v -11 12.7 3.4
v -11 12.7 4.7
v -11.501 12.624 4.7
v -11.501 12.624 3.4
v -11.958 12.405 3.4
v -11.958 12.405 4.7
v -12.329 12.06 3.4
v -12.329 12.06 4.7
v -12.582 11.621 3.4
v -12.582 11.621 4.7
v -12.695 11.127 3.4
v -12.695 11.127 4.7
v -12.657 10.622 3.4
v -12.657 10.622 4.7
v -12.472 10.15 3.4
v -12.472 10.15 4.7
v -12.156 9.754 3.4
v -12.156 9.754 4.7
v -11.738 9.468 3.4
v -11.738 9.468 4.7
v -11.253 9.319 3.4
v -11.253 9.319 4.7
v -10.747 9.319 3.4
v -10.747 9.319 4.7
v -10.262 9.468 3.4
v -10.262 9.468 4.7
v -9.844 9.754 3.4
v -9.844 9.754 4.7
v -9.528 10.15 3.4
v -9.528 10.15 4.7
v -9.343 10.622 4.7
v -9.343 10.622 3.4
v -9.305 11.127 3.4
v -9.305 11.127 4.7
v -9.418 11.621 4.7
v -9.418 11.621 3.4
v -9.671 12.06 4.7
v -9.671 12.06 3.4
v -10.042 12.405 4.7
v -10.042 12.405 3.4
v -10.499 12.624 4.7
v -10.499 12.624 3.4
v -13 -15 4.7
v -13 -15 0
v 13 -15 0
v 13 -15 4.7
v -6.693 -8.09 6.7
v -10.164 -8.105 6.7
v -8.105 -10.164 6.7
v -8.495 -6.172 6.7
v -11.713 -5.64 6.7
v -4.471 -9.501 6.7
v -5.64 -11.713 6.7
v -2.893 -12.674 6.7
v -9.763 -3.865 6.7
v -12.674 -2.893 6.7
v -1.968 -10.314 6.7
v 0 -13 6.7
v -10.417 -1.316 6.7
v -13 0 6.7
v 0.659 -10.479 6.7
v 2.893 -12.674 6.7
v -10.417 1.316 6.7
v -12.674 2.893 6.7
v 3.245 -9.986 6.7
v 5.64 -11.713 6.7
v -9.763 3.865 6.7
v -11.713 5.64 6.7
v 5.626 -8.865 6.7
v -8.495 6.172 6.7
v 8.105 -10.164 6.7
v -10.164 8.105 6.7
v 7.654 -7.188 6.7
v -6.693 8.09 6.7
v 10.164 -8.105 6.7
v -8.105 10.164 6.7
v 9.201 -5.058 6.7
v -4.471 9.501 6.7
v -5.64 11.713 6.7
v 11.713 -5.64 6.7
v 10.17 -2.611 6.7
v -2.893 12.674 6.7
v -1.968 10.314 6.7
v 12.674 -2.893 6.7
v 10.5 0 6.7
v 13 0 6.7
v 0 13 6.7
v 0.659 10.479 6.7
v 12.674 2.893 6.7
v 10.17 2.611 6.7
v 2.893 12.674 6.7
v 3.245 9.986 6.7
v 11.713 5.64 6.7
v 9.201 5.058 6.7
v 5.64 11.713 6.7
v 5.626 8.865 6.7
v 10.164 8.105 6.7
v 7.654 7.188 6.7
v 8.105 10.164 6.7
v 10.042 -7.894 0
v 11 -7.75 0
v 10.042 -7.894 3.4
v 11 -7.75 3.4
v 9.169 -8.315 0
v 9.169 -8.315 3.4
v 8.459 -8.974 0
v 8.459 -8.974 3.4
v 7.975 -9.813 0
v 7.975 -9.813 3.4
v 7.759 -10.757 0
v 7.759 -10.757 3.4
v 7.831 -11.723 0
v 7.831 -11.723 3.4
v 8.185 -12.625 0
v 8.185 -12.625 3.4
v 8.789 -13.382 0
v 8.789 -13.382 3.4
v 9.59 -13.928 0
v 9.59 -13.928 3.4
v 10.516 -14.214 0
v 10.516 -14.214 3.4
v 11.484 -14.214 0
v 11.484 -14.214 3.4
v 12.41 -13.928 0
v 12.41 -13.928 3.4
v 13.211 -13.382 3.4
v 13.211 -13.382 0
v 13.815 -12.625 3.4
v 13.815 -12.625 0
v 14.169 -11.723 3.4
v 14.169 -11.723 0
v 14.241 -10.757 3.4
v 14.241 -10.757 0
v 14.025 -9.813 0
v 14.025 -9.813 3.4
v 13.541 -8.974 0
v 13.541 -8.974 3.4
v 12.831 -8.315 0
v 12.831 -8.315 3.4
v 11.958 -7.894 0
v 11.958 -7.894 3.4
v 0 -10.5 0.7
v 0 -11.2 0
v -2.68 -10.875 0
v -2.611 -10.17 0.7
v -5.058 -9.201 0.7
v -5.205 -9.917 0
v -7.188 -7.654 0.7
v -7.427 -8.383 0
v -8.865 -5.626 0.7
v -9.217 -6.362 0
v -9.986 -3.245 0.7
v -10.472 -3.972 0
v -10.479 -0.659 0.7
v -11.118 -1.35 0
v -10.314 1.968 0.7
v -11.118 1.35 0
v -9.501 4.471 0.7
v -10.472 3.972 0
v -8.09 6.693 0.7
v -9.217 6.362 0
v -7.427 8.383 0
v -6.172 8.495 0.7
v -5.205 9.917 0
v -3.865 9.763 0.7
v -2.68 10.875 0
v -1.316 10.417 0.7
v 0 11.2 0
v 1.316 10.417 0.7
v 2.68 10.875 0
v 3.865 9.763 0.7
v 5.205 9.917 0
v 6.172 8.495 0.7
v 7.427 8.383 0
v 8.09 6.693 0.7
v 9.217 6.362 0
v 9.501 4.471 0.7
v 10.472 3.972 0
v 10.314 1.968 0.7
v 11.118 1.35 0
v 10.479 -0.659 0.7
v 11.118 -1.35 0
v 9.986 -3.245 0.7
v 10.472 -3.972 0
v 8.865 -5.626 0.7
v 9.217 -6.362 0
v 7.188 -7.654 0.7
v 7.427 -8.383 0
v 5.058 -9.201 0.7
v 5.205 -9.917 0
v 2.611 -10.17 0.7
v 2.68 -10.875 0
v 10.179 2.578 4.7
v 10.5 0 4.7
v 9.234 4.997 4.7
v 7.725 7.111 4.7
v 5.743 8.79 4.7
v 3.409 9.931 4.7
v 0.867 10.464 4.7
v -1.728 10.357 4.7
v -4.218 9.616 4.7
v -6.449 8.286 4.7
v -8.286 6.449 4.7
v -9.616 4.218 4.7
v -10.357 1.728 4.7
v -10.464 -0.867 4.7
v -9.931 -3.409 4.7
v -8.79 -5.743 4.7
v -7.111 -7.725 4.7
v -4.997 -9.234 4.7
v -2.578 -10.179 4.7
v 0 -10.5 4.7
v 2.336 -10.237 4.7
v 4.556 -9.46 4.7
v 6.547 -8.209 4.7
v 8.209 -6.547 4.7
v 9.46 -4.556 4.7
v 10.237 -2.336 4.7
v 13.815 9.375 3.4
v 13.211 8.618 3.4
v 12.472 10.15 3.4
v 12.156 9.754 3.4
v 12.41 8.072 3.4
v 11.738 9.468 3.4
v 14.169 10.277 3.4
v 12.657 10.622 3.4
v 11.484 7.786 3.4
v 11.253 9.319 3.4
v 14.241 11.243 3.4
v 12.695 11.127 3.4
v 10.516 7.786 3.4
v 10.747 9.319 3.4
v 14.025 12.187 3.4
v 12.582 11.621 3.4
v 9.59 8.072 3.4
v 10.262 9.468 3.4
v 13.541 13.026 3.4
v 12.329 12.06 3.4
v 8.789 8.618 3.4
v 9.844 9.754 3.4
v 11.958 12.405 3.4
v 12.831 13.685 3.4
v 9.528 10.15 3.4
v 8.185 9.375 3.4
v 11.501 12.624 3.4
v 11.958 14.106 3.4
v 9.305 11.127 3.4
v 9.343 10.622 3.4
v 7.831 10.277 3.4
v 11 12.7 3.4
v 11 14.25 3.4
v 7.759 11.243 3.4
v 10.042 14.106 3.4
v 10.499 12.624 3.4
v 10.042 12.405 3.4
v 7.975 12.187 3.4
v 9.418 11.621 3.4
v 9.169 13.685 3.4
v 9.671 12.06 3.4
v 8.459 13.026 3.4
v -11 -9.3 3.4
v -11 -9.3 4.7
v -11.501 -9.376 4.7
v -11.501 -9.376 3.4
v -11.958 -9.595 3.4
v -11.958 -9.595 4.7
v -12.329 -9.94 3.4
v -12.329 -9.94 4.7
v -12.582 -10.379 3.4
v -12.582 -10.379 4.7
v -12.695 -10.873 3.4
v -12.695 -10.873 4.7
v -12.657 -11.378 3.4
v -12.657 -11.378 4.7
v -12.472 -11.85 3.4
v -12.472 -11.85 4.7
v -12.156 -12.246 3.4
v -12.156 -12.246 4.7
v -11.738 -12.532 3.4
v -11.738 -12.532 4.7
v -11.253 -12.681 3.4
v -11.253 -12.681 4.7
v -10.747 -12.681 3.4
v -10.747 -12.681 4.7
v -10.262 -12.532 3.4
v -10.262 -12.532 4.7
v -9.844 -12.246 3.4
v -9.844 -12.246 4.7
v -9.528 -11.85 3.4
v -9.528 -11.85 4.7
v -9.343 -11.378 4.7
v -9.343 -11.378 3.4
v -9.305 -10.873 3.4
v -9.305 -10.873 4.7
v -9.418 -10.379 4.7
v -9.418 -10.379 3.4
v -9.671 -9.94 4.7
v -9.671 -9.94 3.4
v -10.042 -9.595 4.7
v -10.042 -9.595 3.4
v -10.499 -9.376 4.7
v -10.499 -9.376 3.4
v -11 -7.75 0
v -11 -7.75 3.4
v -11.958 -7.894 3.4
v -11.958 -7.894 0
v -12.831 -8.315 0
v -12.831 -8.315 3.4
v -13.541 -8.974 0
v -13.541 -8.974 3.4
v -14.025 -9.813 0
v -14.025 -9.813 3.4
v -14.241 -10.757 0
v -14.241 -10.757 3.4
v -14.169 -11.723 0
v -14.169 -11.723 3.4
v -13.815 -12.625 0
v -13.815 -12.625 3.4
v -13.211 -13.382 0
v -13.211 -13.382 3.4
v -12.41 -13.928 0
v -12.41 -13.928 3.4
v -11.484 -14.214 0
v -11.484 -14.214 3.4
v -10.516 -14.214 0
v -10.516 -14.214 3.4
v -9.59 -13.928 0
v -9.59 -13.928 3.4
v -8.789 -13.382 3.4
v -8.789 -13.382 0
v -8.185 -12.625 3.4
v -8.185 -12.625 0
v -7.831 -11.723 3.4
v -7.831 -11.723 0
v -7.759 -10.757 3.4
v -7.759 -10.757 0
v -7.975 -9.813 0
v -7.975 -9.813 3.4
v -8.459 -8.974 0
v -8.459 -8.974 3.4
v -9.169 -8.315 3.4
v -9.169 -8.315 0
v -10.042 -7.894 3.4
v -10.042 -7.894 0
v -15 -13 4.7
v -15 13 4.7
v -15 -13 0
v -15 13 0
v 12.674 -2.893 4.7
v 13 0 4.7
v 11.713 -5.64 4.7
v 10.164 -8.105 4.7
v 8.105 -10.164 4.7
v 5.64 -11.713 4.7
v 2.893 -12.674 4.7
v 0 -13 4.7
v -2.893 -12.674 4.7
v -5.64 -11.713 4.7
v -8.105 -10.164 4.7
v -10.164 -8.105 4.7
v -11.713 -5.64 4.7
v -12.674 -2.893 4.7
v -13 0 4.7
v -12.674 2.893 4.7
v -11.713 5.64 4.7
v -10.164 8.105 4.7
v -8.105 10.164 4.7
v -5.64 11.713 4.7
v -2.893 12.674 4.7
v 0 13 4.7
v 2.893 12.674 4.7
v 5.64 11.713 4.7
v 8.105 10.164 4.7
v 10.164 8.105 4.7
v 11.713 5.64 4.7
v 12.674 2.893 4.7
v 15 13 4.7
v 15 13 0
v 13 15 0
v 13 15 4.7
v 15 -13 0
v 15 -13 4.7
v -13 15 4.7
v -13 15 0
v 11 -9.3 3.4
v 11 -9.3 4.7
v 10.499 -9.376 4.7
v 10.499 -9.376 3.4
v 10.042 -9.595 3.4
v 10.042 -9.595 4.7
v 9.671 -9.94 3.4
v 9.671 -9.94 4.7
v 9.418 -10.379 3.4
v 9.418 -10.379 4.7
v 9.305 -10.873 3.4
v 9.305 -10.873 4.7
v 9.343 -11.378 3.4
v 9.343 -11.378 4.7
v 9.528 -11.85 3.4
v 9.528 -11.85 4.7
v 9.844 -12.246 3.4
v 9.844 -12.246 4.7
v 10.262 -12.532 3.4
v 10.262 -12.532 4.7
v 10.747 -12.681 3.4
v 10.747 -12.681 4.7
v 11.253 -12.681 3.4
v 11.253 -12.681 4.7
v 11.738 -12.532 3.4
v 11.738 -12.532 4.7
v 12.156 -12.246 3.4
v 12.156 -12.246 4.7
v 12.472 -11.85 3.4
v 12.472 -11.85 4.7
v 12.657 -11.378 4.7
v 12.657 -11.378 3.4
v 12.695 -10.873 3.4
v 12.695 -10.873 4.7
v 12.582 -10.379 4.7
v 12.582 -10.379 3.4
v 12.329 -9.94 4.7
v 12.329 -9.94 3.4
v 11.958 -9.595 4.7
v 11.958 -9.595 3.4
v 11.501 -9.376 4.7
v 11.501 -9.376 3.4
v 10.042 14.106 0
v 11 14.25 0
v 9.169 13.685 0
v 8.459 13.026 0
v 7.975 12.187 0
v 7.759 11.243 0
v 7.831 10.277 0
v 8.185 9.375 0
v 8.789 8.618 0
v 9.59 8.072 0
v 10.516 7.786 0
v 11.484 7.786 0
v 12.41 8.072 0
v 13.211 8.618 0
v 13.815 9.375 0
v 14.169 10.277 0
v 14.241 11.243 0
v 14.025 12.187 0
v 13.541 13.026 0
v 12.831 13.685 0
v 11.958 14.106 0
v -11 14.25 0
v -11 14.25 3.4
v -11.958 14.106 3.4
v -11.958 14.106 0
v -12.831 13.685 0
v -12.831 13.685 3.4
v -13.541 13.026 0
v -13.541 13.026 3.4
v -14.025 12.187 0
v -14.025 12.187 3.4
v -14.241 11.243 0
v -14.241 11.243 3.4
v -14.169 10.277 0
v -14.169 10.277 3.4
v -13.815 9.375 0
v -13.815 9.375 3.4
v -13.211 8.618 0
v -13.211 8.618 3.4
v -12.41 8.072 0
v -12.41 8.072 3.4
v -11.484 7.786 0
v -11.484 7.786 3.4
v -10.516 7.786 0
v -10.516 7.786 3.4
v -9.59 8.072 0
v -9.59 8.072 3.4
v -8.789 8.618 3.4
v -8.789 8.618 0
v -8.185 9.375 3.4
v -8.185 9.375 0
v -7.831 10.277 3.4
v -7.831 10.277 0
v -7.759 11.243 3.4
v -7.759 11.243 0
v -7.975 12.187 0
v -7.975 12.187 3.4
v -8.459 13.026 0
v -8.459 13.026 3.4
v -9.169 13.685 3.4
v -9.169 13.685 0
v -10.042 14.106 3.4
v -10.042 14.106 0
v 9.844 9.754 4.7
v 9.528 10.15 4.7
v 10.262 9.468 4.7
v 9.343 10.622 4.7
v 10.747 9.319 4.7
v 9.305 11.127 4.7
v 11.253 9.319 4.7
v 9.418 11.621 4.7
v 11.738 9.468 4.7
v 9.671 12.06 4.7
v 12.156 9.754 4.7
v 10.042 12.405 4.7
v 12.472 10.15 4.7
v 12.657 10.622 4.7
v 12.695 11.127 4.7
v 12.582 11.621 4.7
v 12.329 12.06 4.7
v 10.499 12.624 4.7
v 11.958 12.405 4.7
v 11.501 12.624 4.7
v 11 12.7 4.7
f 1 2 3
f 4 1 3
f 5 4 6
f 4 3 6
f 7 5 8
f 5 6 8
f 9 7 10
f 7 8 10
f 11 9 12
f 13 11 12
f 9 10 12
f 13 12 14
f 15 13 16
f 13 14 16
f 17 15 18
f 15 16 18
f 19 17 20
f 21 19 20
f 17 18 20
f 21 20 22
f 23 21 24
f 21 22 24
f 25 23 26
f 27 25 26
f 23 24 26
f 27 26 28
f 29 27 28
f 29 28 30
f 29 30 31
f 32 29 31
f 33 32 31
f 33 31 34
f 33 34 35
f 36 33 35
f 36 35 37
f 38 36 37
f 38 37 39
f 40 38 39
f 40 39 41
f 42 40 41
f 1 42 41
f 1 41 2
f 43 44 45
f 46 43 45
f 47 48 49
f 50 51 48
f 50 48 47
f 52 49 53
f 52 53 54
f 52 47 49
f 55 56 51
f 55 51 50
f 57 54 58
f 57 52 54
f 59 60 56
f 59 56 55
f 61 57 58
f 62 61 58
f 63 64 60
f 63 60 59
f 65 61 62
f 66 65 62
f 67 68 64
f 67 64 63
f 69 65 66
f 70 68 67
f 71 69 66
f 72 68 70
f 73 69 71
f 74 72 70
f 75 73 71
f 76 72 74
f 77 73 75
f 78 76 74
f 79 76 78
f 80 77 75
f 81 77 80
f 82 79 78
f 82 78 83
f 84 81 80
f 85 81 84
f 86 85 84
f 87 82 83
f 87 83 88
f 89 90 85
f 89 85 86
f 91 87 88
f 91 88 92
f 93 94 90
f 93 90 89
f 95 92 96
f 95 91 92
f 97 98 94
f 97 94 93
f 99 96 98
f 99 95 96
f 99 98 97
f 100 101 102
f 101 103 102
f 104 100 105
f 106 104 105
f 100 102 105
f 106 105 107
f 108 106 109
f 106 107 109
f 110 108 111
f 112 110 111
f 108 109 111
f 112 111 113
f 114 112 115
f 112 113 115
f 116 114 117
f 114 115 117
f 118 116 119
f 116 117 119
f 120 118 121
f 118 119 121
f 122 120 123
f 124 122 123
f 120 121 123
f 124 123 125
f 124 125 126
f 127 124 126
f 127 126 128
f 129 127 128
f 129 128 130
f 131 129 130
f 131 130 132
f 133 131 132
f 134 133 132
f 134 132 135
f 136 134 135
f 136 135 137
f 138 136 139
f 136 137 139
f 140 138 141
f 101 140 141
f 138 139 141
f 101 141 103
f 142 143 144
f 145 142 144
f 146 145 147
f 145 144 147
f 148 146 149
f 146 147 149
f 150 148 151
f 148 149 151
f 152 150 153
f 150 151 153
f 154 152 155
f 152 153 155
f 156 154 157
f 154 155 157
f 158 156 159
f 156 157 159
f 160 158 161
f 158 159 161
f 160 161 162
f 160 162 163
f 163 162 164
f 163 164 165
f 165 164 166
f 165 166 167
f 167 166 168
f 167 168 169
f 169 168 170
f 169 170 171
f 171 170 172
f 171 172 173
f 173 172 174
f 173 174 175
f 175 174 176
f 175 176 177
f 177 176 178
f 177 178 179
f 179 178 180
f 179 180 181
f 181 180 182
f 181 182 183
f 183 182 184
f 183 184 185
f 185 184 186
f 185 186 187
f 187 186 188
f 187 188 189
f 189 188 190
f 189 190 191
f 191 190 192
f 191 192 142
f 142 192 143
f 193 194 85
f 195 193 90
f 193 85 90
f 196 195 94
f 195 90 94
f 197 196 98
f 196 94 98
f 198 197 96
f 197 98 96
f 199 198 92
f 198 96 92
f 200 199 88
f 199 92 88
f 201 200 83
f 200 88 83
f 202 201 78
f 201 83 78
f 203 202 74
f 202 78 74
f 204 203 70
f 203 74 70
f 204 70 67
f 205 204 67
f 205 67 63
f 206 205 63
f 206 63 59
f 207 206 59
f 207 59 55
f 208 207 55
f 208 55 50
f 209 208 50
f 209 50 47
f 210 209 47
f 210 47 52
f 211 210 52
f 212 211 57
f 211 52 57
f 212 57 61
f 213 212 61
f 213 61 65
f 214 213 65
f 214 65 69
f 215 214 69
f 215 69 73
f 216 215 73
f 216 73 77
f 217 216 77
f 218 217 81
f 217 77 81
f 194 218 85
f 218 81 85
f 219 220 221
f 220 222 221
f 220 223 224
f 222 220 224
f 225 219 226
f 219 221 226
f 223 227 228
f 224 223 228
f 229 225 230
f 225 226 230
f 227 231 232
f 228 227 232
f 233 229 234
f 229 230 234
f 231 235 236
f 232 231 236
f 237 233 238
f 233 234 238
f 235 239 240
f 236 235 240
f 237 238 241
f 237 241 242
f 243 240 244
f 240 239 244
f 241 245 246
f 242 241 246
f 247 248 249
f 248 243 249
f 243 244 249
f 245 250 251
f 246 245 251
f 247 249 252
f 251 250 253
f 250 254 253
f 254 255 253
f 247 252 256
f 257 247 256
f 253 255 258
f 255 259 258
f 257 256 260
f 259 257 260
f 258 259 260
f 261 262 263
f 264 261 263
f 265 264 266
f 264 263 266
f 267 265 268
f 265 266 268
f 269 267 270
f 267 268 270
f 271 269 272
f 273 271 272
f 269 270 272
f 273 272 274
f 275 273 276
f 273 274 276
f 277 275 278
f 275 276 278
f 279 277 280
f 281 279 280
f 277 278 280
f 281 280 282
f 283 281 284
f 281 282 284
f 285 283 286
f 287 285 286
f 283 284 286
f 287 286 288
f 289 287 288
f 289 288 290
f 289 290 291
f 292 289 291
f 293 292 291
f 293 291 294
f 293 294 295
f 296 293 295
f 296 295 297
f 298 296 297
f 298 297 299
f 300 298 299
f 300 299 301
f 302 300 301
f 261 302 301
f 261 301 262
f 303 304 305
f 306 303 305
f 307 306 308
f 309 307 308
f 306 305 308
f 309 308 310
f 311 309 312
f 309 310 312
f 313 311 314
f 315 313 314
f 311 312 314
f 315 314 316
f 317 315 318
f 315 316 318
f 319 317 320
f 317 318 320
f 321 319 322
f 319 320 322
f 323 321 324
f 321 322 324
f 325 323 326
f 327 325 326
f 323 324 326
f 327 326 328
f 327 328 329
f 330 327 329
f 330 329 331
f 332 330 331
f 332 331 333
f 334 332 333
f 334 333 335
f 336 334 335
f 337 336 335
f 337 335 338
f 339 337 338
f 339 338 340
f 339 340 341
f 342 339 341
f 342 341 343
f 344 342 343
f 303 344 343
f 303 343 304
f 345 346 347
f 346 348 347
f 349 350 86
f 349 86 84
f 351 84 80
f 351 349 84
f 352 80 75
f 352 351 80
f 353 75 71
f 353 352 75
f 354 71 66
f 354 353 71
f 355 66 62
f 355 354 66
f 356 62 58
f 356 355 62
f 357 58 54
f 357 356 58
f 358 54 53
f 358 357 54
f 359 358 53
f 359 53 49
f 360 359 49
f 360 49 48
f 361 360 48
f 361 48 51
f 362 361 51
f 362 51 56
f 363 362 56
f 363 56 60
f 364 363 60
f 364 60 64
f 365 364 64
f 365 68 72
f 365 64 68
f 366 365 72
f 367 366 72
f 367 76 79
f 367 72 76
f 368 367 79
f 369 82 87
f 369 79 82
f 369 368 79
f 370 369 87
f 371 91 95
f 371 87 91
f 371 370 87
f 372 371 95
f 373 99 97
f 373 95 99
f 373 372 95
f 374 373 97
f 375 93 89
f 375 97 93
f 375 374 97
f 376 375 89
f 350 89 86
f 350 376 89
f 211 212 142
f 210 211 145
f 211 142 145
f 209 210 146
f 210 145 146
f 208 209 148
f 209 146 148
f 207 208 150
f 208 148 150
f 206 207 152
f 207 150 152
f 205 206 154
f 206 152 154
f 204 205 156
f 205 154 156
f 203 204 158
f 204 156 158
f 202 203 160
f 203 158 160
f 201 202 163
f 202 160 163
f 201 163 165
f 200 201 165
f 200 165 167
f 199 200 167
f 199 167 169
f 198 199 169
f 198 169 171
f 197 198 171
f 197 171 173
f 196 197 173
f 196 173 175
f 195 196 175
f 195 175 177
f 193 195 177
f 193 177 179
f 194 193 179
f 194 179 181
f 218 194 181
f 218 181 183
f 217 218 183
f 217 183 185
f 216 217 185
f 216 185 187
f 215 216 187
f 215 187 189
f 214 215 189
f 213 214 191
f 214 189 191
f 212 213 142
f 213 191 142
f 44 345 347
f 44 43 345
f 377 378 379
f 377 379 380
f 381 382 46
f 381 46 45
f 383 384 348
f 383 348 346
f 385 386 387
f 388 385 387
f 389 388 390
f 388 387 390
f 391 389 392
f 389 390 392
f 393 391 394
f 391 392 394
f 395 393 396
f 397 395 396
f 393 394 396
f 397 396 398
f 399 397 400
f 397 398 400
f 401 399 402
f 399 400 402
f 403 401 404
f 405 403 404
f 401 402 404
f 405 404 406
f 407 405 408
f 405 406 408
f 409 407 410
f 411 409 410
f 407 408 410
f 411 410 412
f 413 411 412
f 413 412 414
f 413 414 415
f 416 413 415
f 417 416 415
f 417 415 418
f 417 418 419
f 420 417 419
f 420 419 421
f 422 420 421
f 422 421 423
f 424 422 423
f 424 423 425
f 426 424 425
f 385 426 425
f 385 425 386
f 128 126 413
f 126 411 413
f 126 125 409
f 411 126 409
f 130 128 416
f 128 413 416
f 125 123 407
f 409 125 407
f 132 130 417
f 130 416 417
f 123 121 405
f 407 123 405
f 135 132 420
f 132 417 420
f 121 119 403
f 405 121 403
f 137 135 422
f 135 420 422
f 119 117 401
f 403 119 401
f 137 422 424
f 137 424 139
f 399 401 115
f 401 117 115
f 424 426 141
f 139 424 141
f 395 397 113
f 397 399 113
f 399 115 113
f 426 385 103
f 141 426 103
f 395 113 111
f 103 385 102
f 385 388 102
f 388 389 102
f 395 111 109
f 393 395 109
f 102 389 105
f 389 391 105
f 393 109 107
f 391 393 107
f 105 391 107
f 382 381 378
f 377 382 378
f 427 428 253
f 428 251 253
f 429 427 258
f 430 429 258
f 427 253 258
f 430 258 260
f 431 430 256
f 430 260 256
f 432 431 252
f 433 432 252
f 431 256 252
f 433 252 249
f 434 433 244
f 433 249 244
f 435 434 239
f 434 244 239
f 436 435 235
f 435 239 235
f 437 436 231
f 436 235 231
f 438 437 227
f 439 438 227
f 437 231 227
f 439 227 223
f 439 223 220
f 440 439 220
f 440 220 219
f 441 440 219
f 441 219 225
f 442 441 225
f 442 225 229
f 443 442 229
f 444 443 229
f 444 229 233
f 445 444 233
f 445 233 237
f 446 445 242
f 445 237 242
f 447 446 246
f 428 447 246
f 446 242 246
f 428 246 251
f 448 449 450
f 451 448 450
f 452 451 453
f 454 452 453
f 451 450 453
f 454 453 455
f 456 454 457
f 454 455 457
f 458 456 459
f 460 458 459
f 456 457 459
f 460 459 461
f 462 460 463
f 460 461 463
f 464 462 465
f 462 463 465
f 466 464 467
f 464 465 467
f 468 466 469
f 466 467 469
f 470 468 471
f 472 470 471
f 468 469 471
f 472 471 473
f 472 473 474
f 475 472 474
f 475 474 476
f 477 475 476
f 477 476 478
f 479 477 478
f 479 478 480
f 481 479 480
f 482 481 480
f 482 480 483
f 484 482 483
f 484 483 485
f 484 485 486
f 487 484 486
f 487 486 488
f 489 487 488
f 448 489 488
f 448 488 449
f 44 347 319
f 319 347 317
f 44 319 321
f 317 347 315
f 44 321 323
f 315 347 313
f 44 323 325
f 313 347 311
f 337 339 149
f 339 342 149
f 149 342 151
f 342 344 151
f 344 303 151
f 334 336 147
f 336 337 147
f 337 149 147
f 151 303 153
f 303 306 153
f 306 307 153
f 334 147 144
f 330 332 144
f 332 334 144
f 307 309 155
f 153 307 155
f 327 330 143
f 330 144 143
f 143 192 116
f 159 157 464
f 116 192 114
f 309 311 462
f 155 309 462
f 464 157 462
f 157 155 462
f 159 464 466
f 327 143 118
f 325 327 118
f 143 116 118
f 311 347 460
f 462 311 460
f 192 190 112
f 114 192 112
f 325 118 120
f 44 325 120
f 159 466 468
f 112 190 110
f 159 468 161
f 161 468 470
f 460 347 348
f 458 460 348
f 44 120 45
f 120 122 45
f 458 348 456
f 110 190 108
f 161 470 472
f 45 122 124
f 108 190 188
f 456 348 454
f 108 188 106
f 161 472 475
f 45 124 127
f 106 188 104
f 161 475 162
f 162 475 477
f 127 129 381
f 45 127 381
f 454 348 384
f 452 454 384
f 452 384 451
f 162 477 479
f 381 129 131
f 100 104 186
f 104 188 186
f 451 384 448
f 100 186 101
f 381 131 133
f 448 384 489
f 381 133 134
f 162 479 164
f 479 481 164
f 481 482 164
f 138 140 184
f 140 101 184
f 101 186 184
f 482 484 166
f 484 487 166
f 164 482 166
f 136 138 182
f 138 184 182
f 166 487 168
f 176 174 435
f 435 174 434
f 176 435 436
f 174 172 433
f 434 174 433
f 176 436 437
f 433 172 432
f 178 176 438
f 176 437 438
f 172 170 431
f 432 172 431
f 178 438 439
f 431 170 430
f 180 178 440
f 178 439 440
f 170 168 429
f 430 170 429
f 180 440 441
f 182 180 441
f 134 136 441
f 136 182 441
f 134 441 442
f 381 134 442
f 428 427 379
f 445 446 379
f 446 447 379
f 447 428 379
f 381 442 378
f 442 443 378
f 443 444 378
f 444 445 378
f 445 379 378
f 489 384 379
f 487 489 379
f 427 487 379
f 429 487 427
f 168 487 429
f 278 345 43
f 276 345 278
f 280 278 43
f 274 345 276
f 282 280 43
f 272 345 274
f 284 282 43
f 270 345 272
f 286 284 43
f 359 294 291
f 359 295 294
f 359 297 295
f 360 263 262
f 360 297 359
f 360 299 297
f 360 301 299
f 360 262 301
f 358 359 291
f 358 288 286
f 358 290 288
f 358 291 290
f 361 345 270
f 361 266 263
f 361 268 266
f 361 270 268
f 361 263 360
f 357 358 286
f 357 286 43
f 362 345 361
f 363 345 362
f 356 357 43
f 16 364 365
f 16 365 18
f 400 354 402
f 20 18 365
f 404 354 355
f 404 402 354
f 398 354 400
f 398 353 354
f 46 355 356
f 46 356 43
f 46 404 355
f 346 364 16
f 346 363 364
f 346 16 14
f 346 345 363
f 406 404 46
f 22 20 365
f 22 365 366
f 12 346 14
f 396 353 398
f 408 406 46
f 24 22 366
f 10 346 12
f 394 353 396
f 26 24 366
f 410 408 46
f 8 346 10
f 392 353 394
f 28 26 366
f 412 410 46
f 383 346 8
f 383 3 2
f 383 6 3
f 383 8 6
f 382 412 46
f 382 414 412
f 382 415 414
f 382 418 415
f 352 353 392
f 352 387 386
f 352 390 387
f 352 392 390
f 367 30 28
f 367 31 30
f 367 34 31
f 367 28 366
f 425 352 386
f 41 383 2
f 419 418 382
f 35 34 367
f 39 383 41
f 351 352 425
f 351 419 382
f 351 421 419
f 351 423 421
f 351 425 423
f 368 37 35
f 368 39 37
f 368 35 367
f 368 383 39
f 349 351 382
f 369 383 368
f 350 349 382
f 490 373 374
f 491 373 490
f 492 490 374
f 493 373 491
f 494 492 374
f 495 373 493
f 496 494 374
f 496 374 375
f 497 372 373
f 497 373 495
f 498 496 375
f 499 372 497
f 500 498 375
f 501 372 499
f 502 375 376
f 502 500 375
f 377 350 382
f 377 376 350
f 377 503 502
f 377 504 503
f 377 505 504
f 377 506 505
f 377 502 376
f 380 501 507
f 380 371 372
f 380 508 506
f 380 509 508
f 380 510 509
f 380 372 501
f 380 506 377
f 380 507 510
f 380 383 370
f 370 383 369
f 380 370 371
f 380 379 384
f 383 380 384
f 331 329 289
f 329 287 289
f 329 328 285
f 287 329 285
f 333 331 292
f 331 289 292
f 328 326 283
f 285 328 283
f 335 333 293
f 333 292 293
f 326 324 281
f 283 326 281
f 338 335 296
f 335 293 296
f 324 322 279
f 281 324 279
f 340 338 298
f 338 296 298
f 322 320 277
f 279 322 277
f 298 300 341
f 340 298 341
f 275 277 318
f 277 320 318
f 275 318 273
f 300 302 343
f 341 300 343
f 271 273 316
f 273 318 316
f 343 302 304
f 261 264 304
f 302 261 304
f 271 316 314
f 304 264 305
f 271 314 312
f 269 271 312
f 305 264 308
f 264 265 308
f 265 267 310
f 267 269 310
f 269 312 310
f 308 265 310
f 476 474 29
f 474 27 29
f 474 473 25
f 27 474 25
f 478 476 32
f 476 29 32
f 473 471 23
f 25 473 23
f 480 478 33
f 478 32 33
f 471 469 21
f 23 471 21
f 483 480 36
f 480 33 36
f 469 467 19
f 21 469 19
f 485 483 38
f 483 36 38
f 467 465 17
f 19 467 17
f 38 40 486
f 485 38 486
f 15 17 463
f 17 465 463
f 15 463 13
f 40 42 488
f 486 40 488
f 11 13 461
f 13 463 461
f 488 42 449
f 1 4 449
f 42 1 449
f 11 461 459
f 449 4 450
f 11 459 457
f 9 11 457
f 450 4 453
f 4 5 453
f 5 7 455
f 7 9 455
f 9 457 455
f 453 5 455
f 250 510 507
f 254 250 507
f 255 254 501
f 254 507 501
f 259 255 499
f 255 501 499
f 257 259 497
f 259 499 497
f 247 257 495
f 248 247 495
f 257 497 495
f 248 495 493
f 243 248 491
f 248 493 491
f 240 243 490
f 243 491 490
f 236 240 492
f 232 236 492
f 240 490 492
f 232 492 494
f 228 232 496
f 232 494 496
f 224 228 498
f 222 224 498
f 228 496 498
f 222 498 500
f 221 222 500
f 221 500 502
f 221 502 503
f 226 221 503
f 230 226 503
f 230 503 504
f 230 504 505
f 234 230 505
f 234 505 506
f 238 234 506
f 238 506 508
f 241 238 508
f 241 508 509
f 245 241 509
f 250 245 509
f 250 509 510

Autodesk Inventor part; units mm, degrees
ref_plane "YZ Plane" through (0, 0, 0) normal (1, 0, 0) x (0, 1, 0)
ref_plane "XZ Plane" through (0, 0, 0) normal (0, 1, 0) x (-1, 0, 0)
ref_plane "XY Plane" through (0, 0, 0) normal (0, 0, 1) x (1, 0, 0)
sketch "Sketch1" plane through (0, 0, 0) normal (0, 0, 1) x (1, 0, 0)
  line L0 (-15, -15) -> (15, -15)
  line L1 (15, -15) -> (15, 15)
  line L2 (15, 15) -> (-15, 15)
  line L3 (-15, 15) -> (-15, -15)
  line L4 (-15, -15) -> (15, 15) construction
  line L5 (15, -15) -> (-15, 15) construction
  point P0 (0, 0)
  dimension "d0" = 30
  dimension "d1" = 30
extrude "Extrusion1" add sketch "Sketch1" along normal blind 4.7
sketch "Sketch2" plane through (0, 0, 4.7) normal (0, 0, 1) x (1, 0, 0)
  point P0 (0, 0)
hole "Hole1" at (0, 0, 4.7) direction (0, 0, -1) diameter 21 end through all
sketch "Sketch3" plane through (0, 0, 0) normal (0, 1, 0) x (-1, 0, 0)
  line L0 (-10.5, 6.7) -> (-13, 6.7)
  line L1 (-13, 6.7) -> (-13, 4.7)
  line L2 (-13, 4.7) -> (-10.5, 4.7)
  line L3 (-10.5, 4.7) -> (-10.5, 6.7)
  line L4 (-15, 4.7) -> (15, 4.7) projected
  line L5 (-10.5, 0) -> (-10.5, 4.7) projected
  line L6 (0, 0) -> (0, 4.7)
  line L7 (10.5, 0) -> (-10.5, 0) projected
  dimension "d13" = 26
  dimension "d15" = 2
revolve "Revolution1" add sketch "Sketch3" angle 360 about axis through (0, 0, 0) along (0, 0, 1) contours L3 L2 L1 L0
sketch "Sketch4" plane through (0, 0, 0) normal (0, 0, -1) x (-1, 0, 0)
  line L0 (-11, -11) -> (11, -11)
  line L1 (11, -11) -> (11, 11)
  line L2 (11, 11) -> (-11, 11)
  line L3 (-11, 11) -> (-11, -11)
  line L4 (-11, -11) -> (11, 11) construction
  line L5 (11, -11) -> (-11, 11) construction
  point P0 (0, 0)
  point P1 (0, 0)
  dimension "d17" = 22
hole "Hole2" at (11, 11, 0) at (-11, 11, 0) at (-11, -11, 0) at (11, -11, 0) direction (0, 0, 1) diameter 3.4 end through all counterbore diameter 6.5 counterbore depth 3.4
chamfer "Chamfer1" distance 2 angle 45 4 edges at (15, -15, 2.35) (15, 15, 2.35) (-15, 15, 2.35) (-15, -15, 2.35)
chamfer "Chamfer2" distance 0.7 angle 45 1 edges at (0, 10.5, 0)
properties part number "Festlager Deckel" material "Aluminum 6061"
